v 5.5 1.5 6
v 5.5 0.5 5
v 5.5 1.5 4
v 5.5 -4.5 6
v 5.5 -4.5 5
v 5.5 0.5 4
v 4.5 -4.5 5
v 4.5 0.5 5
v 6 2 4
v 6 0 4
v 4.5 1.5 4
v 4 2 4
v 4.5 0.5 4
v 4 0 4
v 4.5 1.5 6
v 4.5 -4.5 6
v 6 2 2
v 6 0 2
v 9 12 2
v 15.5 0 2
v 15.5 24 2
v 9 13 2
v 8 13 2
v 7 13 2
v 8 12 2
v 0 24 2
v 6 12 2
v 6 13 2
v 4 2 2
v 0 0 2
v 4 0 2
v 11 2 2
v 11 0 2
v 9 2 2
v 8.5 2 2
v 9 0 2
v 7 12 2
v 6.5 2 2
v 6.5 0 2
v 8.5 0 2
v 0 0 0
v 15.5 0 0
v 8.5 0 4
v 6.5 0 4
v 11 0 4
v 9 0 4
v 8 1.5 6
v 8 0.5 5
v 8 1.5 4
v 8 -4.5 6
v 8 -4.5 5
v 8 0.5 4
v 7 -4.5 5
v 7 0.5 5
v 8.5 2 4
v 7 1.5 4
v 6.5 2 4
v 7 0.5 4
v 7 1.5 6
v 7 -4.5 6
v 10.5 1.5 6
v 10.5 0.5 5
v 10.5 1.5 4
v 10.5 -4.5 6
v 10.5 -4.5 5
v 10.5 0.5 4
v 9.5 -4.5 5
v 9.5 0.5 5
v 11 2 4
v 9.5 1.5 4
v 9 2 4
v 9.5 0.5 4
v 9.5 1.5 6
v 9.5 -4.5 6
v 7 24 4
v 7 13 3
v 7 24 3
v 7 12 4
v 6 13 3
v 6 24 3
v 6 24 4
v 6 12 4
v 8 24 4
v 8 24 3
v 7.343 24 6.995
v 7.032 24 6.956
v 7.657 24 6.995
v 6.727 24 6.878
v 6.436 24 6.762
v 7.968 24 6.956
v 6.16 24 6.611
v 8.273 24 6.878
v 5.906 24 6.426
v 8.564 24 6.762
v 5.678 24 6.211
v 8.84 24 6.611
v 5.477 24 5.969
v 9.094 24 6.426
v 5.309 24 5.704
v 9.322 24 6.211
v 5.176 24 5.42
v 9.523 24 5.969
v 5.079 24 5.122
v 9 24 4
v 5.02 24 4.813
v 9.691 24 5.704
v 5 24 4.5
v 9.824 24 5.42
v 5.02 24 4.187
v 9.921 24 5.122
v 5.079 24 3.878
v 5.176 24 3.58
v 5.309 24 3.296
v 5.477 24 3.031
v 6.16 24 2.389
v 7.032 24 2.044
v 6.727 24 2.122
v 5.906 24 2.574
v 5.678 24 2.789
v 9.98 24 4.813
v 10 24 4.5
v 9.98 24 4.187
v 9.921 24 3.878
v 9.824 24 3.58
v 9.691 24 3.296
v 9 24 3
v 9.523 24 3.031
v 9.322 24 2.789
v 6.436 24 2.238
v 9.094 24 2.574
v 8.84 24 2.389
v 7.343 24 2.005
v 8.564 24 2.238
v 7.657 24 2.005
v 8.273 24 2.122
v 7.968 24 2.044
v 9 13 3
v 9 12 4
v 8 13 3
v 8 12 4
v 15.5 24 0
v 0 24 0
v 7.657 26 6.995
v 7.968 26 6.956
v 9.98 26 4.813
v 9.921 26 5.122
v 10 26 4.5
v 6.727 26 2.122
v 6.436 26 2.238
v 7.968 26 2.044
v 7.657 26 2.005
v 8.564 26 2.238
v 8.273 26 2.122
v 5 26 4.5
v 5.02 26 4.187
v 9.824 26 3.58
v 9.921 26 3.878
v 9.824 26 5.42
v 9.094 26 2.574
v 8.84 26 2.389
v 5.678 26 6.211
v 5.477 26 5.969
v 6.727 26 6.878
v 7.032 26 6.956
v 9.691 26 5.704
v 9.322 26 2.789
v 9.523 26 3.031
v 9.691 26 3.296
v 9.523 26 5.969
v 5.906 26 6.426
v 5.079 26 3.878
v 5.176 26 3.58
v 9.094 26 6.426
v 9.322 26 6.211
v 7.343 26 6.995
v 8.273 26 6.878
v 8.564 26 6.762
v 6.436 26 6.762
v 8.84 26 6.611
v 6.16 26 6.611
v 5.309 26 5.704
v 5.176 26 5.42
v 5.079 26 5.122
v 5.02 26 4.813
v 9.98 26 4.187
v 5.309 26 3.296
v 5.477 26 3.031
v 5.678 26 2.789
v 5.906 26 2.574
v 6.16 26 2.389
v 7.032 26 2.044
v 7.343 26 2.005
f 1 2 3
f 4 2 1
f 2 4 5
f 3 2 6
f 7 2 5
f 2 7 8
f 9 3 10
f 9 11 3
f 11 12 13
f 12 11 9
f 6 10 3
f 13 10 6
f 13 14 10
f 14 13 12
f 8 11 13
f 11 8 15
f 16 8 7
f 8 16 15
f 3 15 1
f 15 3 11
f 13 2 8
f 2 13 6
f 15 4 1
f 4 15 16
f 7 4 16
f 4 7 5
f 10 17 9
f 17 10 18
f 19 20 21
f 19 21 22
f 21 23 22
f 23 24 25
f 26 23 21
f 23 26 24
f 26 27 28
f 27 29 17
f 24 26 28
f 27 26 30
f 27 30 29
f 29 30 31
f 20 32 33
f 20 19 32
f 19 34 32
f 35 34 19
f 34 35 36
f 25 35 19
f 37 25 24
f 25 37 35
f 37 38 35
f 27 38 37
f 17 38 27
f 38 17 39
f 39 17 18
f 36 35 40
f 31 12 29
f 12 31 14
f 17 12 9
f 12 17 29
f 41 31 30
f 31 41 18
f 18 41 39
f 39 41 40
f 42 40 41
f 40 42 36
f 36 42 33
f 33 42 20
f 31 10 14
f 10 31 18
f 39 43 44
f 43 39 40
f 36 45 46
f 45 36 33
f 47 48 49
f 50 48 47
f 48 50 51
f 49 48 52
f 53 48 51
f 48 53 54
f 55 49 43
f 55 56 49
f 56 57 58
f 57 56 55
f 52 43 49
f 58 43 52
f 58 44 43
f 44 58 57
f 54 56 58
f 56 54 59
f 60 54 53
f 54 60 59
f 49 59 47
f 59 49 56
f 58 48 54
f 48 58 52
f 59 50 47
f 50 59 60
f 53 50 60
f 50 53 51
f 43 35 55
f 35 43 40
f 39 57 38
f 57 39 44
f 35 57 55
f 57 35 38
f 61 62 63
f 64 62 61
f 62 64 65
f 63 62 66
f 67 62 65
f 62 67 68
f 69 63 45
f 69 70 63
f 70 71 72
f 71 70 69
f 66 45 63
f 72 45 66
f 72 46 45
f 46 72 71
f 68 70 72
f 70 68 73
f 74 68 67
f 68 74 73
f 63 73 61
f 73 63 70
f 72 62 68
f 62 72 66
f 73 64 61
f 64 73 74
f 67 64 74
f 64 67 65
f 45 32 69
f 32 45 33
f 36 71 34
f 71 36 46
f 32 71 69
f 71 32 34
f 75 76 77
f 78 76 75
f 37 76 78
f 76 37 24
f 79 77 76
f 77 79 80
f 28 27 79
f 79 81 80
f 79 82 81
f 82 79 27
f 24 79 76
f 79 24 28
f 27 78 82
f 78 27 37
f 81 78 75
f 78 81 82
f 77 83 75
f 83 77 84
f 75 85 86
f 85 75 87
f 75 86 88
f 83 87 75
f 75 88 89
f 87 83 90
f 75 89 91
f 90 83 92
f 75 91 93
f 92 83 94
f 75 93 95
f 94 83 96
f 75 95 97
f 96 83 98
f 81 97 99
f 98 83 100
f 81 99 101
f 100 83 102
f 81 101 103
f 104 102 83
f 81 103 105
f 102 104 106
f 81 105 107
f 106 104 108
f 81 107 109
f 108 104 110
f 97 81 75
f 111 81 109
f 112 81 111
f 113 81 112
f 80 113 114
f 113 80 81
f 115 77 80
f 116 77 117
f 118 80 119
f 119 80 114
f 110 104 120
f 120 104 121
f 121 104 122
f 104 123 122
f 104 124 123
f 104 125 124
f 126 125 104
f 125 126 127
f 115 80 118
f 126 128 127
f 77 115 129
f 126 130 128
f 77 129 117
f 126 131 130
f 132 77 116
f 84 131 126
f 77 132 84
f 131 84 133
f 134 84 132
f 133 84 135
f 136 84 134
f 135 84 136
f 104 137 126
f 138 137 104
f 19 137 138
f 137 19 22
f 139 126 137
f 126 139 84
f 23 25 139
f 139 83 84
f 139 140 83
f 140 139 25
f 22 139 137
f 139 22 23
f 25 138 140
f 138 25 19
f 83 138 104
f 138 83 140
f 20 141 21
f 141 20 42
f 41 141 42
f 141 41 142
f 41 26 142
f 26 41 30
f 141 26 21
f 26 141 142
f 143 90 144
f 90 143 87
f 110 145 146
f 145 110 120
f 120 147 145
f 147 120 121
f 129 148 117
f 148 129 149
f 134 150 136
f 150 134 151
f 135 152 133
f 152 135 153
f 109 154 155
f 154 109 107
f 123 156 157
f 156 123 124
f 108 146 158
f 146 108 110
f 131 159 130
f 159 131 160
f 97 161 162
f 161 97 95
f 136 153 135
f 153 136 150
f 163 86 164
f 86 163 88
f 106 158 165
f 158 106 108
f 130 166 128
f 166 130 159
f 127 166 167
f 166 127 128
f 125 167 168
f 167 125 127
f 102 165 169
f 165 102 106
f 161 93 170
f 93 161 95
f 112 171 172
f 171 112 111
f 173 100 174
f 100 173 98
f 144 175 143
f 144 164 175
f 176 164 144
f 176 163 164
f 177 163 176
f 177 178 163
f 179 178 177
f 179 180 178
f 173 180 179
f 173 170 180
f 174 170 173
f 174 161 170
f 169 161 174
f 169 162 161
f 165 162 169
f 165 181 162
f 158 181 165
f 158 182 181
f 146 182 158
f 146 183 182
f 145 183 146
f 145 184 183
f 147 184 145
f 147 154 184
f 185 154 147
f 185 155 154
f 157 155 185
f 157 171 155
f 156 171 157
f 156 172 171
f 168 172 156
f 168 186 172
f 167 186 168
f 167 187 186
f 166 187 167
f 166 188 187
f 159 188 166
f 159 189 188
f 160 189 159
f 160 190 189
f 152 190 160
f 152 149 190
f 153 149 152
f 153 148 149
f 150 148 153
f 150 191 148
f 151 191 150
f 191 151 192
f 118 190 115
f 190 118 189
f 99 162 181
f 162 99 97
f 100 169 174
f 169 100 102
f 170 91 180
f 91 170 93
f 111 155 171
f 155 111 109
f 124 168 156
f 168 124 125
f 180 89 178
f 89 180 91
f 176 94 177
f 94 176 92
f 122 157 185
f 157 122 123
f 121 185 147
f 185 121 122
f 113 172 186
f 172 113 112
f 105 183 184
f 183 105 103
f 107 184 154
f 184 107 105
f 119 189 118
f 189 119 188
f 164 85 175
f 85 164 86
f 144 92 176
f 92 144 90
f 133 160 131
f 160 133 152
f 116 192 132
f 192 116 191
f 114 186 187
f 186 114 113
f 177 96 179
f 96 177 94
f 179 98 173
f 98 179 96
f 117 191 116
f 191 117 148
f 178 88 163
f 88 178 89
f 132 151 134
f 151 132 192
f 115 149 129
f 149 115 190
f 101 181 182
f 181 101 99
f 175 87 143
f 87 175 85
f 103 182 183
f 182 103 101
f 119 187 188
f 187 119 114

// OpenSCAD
module ky_18() {
  module pin() {
    //Black plastic Signal
    color("Red", 0.25) translate([4, 0, 2]) cube([2, 2, 2]);
    //Connection pin
    color("Pink", 0.25) {
      translate([4.5, 0.5, 4]) cube([1, 1, 1]);
      translate([4.5, -4.5, 5]) cube([1, 6, 1]);
    }
  }
  
  module photoresistor_pin() {
    translate([6,12, 2]) cube([1, 1, 1]);
    translate([6,12, 3]) cube([1, 12, 1]);
  }
 
  //Board
  color("Green", 0.25) cube([15.5, 24, 2]);
 
  //Connection pins (the 3 of them)
  pin();
  translate([2.5,0,0]) pin();
  translate([5,0,0]) pin();
  
  //Photoresistor pins (2 of them)
  photoresistor_pin();
  translate([2,0,0]) photoresistor_pin();
  
  //Photo resistor
  translate([7.5,26,4.5]) rotate([90,0,0]) cylinder(2,2.5,2.5,$fn=50);
}

ky_18();
